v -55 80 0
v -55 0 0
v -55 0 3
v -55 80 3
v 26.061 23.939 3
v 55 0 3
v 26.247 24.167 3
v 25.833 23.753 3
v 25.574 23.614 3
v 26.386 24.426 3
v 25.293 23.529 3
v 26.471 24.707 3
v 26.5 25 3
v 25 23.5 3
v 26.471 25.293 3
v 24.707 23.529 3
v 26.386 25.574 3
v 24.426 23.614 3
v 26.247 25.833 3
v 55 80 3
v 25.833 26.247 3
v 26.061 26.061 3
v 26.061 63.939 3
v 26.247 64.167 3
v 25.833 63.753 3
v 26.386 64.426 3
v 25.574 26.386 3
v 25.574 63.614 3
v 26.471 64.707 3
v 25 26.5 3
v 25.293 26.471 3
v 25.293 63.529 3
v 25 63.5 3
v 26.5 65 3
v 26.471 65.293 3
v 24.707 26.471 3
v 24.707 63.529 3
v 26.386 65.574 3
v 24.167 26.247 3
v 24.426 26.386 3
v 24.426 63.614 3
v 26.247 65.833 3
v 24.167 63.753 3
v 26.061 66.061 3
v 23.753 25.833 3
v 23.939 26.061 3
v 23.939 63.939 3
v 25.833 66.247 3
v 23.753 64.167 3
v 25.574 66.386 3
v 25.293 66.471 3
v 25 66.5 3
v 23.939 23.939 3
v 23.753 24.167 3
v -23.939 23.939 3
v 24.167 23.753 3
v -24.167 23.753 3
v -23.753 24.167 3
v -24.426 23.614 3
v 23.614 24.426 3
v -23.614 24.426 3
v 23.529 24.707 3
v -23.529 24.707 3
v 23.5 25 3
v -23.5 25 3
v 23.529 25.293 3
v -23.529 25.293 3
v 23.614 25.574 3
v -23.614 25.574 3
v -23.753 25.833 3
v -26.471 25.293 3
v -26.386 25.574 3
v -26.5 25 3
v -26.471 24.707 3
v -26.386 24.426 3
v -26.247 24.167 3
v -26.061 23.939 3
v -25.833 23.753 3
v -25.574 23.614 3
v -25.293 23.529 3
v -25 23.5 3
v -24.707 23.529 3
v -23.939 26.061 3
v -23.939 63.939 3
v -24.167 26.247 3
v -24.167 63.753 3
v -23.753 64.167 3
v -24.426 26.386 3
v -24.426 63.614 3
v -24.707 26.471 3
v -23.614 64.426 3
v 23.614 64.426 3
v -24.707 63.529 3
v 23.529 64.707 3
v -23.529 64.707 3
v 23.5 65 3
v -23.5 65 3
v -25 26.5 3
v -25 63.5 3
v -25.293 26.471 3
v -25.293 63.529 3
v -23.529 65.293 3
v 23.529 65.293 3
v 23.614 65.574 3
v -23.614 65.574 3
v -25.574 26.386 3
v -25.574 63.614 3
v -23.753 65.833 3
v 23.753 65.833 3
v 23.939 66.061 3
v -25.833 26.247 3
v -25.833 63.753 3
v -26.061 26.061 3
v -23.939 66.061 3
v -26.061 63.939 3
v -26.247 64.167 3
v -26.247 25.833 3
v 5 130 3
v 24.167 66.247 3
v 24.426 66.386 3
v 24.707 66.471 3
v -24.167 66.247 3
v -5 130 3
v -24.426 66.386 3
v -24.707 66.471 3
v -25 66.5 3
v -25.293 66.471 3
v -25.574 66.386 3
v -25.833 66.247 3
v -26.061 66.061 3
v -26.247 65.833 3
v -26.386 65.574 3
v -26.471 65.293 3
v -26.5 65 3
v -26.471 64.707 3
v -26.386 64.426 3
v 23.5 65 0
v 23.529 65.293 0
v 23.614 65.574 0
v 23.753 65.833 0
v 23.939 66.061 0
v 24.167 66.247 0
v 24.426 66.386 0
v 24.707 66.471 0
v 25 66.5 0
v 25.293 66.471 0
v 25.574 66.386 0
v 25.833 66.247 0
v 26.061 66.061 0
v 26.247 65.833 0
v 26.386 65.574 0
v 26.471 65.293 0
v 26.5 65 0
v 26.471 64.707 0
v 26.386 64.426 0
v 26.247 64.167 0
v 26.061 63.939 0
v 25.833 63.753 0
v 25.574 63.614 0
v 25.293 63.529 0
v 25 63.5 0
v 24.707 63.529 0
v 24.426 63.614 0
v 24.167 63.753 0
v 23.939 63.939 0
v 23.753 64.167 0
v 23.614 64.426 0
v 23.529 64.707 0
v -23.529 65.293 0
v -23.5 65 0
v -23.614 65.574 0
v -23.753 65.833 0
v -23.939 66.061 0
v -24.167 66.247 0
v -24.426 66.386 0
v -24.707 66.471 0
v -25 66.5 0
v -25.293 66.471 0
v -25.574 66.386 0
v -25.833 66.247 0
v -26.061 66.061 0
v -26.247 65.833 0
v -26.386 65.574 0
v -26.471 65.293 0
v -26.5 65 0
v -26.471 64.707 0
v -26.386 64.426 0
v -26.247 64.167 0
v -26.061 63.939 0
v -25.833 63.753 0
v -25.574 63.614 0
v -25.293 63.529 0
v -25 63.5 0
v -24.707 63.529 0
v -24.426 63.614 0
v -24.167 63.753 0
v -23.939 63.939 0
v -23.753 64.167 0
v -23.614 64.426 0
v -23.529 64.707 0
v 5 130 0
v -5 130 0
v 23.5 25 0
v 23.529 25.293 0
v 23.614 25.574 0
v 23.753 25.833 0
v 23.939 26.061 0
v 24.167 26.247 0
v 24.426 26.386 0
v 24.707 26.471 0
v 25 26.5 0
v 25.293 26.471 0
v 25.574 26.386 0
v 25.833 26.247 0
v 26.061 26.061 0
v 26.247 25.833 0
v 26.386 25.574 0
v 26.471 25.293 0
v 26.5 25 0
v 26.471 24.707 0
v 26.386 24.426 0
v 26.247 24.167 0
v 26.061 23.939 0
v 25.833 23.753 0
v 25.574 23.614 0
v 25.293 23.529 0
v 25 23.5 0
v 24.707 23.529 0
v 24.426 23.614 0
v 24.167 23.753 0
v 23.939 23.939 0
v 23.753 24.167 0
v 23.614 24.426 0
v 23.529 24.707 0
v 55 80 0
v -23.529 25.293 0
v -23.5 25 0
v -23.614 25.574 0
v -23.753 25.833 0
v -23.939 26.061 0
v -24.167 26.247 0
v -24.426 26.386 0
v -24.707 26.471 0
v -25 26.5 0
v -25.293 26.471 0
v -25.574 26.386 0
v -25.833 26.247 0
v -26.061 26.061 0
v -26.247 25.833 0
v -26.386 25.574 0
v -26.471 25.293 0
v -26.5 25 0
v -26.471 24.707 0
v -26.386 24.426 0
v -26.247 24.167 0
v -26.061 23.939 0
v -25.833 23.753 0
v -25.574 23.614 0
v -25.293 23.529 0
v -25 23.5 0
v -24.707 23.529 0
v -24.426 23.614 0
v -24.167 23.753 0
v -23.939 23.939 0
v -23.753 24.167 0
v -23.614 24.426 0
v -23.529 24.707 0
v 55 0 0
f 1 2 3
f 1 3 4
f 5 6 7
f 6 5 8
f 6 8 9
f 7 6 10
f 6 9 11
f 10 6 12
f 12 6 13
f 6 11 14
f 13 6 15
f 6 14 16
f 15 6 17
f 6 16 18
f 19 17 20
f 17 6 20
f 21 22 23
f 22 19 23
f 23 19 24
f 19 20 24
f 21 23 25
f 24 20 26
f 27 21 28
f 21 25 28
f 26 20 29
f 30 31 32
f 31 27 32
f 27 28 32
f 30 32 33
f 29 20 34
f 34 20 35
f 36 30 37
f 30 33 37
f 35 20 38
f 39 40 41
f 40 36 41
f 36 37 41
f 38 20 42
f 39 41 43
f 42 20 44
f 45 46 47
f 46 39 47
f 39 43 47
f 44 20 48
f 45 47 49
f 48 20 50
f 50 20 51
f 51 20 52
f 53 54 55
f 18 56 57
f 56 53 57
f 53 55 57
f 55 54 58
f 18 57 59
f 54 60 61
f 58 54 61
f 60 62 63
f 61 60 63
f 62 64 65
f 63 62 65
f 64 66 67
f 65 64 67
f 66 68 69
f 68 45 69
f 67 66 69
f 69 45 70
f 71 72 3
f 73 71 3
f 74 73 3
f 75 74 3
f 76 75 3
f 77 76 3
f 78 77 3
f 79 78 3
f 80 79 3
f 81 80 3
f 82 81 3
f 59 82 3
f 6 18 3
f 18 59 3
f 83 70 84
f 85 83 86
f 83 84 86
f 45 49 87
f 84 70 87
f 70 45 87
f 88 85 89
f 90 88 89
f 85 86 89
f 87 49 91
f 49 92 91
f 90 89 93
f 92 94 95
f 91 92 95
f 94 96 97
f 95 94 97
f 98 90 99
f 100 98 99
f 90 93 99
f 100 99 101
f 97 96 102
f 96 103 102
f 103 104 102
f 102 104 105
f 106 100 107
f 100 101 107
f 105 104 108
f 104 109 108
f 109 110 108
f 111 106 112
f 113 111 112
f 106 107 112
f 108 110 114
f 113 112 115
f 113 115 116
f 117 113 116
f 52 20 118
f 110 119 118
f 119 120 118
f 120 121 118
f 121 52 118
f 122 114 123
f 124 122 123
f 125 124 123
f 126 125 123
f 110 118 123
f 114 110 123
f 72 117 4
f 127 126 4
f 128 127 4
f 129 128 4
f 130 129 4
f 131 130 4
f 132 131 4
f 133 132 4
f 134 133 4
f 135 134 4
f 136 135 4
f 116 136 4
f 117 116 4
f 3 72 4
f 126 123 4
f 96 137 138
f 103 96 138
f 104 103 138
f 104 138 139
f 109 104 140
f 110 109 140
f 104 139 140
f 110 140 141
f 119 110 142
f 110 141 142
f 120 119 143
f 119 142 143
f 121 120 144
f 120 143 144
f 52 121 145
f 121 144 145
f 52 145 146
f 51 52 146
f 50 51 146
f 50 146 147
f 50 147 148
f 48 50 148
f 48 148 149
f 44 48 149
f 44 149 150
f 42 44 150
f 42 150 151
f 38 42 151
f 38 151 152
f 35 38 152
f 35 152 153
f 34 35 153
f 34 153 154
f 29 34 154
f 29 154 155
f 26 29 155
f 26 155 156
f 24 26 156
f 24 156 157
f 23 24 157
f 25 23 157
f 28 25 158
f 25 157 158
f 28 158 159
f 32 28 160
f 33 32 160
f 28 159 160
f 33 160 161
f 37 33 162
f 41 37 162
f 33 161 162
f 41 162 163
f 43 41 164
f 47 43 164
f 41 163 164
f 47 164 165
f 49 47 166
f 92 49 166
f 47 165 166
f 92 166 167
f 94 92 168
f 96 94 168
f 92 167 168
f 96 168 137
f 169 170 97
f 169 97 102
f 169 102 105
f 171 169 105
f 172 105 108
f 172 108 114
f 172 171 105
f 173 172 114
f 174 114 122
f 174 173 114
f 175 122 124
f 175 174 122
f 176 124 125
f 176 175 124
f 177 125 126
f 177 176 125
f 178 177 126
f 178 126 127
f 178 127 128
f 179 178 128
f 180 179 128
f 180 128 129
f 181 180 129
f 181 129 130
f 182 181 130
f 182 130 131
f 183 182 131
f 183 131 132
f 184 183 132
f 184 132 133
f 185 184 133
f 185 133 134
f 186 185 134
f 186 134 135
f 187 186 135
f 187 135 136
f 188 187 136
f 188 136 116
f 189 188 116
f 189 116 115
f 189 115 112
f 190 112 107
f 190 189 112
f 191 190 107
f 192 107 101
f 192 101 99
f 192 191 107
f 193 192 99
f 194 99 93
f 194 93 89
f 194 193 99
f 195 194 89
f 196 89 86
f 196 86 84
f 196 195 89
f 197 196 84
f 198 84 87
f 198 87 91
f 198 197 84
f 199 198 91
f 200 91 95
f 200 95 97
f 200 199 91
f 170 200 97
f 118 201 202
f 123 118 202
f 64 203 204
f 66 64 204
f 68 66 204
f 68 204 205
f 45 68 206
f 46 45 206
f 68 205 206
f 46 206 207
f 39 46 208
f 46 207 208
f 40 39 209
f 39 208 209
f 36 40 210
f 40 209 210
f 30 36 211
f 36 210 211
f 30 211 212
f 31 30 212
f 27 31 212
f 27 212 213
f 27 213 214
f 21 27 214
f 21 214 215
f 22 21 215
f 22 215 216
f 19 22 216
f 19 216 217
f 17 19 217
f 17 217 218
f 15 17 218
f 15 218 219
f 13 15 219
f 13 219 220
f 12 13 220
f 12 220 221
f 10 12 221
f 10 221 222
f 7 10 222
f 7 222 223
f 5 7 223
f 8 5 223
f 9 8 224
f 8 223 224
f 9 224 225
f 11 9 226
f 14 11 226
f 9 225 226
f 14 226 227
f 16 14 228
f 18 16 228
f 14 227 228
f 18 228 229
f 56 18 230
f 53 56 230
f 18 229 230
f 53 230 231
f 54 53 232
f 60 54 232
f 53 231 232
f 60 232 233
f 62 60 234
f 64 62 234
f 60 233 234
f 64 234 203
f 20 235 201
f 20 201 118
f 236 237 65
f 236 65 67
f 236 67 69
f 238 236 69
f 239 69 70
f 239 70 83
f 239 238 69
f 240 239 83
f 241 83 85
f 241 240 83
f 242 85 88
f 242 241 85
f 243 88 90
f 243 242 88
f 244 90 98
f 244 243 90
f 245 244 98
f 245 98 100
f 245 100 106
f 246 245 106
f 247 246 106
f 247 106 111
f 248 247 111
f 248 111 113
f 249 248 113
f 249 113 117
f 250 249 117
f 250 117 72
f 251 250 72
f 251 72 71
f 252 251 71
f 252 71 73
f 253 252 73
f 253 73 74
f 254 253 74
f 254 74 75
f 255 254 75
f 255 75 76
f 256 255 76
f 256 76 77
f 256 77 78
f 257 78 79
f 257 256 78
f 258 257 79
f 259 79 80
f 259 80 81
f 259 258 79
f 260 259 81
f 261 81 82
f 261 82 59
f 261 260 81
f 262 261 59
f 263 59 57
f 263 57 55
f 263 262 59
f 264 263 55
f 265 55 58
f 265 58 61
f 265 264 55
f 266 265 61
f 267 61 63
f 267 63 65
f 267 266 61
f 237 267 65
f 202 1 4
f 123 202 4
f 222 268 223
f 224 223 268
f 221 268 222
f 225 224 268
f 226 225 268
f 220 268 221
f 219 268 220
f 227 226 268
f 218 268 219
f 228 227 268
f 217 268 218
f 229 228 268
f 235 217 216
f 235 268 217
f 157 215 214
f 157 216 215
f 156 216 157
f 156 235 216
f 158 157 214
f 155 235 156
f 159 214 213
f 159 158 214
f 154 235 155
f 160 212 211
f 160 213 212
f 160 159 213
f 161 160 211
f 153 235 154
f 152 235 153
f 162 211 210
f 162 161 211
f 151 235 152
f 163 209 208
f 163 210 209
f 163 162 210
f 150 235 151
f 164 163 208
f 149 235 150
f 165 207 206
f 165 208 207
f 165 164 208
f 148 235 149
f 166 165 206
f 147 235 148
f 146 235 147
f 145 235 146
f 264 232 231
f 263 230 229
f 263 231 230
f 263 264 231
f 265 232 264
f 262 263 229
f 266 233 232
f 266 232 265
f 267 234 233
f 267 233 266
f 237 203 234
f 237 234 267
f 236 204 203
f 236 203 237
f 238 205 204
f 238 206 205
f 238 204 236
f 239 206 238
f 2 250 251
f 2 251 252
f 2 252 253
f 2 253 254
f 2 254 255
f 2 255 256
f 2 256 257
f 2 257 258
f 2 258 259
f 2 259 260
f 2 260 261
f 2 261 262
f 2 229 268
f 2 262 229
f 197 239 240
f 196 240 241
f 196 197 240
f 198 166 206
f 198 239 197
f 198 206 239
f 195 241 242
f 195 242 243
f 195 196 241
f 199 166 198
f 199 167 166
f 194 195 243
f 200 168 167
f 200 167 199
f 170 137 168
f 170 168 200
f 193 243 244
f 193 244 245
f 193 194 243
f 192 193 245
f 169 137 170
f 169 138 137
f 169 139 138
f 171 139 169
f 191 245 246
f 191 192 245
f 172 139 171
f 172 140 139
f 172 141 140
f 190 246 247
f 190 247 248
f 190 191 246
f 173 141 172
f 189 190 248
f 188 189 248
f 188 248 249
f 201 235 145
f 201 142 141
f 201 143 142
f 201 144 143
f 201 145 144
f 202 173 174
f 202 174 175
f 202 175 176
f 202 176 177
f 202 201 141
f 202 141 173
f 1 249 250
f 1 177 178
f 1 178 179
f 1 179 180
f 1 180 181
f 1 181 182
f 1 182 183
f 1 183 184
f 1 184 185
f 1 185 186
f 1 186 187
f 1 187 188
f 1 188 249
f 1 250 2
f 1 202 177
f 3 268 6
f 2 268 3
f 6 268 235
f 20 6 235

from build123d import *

# Parameters (mm, degrees)
F0_W     = 55
F0_H     = 130
F1_DEPTH = 3
F3_D     = 3
F4_SIZE  = 50


with BuildPart() as f1:
    # F0 (on Top) → F1 (new body)
    with BuildSketch(Plane.XY):
        with Locations((27.5, 65)):
            Rectangle(F0_W, F0_H)
    extrude(amount=F1_DEPTH)

    # F3 (through all)
    with Locations(Plane.XY.offset(3)):
        with Locations((25, 25), (25, 65)):
            Hole(F3_D / 2)

    # F4
    f4_edges = [f1.edges().sort_by_distance(p)[0] for p in [
        (55, 130, 1.5),
    ]]
    chamfer(f4_edges, length=F4_SIZE)

    # F5: F1 across plane


with BuildPart() as f1_1:
    add(f1.part)
    add(f1.part.mirror(Plane.YZ))


solid = f1_1.part
